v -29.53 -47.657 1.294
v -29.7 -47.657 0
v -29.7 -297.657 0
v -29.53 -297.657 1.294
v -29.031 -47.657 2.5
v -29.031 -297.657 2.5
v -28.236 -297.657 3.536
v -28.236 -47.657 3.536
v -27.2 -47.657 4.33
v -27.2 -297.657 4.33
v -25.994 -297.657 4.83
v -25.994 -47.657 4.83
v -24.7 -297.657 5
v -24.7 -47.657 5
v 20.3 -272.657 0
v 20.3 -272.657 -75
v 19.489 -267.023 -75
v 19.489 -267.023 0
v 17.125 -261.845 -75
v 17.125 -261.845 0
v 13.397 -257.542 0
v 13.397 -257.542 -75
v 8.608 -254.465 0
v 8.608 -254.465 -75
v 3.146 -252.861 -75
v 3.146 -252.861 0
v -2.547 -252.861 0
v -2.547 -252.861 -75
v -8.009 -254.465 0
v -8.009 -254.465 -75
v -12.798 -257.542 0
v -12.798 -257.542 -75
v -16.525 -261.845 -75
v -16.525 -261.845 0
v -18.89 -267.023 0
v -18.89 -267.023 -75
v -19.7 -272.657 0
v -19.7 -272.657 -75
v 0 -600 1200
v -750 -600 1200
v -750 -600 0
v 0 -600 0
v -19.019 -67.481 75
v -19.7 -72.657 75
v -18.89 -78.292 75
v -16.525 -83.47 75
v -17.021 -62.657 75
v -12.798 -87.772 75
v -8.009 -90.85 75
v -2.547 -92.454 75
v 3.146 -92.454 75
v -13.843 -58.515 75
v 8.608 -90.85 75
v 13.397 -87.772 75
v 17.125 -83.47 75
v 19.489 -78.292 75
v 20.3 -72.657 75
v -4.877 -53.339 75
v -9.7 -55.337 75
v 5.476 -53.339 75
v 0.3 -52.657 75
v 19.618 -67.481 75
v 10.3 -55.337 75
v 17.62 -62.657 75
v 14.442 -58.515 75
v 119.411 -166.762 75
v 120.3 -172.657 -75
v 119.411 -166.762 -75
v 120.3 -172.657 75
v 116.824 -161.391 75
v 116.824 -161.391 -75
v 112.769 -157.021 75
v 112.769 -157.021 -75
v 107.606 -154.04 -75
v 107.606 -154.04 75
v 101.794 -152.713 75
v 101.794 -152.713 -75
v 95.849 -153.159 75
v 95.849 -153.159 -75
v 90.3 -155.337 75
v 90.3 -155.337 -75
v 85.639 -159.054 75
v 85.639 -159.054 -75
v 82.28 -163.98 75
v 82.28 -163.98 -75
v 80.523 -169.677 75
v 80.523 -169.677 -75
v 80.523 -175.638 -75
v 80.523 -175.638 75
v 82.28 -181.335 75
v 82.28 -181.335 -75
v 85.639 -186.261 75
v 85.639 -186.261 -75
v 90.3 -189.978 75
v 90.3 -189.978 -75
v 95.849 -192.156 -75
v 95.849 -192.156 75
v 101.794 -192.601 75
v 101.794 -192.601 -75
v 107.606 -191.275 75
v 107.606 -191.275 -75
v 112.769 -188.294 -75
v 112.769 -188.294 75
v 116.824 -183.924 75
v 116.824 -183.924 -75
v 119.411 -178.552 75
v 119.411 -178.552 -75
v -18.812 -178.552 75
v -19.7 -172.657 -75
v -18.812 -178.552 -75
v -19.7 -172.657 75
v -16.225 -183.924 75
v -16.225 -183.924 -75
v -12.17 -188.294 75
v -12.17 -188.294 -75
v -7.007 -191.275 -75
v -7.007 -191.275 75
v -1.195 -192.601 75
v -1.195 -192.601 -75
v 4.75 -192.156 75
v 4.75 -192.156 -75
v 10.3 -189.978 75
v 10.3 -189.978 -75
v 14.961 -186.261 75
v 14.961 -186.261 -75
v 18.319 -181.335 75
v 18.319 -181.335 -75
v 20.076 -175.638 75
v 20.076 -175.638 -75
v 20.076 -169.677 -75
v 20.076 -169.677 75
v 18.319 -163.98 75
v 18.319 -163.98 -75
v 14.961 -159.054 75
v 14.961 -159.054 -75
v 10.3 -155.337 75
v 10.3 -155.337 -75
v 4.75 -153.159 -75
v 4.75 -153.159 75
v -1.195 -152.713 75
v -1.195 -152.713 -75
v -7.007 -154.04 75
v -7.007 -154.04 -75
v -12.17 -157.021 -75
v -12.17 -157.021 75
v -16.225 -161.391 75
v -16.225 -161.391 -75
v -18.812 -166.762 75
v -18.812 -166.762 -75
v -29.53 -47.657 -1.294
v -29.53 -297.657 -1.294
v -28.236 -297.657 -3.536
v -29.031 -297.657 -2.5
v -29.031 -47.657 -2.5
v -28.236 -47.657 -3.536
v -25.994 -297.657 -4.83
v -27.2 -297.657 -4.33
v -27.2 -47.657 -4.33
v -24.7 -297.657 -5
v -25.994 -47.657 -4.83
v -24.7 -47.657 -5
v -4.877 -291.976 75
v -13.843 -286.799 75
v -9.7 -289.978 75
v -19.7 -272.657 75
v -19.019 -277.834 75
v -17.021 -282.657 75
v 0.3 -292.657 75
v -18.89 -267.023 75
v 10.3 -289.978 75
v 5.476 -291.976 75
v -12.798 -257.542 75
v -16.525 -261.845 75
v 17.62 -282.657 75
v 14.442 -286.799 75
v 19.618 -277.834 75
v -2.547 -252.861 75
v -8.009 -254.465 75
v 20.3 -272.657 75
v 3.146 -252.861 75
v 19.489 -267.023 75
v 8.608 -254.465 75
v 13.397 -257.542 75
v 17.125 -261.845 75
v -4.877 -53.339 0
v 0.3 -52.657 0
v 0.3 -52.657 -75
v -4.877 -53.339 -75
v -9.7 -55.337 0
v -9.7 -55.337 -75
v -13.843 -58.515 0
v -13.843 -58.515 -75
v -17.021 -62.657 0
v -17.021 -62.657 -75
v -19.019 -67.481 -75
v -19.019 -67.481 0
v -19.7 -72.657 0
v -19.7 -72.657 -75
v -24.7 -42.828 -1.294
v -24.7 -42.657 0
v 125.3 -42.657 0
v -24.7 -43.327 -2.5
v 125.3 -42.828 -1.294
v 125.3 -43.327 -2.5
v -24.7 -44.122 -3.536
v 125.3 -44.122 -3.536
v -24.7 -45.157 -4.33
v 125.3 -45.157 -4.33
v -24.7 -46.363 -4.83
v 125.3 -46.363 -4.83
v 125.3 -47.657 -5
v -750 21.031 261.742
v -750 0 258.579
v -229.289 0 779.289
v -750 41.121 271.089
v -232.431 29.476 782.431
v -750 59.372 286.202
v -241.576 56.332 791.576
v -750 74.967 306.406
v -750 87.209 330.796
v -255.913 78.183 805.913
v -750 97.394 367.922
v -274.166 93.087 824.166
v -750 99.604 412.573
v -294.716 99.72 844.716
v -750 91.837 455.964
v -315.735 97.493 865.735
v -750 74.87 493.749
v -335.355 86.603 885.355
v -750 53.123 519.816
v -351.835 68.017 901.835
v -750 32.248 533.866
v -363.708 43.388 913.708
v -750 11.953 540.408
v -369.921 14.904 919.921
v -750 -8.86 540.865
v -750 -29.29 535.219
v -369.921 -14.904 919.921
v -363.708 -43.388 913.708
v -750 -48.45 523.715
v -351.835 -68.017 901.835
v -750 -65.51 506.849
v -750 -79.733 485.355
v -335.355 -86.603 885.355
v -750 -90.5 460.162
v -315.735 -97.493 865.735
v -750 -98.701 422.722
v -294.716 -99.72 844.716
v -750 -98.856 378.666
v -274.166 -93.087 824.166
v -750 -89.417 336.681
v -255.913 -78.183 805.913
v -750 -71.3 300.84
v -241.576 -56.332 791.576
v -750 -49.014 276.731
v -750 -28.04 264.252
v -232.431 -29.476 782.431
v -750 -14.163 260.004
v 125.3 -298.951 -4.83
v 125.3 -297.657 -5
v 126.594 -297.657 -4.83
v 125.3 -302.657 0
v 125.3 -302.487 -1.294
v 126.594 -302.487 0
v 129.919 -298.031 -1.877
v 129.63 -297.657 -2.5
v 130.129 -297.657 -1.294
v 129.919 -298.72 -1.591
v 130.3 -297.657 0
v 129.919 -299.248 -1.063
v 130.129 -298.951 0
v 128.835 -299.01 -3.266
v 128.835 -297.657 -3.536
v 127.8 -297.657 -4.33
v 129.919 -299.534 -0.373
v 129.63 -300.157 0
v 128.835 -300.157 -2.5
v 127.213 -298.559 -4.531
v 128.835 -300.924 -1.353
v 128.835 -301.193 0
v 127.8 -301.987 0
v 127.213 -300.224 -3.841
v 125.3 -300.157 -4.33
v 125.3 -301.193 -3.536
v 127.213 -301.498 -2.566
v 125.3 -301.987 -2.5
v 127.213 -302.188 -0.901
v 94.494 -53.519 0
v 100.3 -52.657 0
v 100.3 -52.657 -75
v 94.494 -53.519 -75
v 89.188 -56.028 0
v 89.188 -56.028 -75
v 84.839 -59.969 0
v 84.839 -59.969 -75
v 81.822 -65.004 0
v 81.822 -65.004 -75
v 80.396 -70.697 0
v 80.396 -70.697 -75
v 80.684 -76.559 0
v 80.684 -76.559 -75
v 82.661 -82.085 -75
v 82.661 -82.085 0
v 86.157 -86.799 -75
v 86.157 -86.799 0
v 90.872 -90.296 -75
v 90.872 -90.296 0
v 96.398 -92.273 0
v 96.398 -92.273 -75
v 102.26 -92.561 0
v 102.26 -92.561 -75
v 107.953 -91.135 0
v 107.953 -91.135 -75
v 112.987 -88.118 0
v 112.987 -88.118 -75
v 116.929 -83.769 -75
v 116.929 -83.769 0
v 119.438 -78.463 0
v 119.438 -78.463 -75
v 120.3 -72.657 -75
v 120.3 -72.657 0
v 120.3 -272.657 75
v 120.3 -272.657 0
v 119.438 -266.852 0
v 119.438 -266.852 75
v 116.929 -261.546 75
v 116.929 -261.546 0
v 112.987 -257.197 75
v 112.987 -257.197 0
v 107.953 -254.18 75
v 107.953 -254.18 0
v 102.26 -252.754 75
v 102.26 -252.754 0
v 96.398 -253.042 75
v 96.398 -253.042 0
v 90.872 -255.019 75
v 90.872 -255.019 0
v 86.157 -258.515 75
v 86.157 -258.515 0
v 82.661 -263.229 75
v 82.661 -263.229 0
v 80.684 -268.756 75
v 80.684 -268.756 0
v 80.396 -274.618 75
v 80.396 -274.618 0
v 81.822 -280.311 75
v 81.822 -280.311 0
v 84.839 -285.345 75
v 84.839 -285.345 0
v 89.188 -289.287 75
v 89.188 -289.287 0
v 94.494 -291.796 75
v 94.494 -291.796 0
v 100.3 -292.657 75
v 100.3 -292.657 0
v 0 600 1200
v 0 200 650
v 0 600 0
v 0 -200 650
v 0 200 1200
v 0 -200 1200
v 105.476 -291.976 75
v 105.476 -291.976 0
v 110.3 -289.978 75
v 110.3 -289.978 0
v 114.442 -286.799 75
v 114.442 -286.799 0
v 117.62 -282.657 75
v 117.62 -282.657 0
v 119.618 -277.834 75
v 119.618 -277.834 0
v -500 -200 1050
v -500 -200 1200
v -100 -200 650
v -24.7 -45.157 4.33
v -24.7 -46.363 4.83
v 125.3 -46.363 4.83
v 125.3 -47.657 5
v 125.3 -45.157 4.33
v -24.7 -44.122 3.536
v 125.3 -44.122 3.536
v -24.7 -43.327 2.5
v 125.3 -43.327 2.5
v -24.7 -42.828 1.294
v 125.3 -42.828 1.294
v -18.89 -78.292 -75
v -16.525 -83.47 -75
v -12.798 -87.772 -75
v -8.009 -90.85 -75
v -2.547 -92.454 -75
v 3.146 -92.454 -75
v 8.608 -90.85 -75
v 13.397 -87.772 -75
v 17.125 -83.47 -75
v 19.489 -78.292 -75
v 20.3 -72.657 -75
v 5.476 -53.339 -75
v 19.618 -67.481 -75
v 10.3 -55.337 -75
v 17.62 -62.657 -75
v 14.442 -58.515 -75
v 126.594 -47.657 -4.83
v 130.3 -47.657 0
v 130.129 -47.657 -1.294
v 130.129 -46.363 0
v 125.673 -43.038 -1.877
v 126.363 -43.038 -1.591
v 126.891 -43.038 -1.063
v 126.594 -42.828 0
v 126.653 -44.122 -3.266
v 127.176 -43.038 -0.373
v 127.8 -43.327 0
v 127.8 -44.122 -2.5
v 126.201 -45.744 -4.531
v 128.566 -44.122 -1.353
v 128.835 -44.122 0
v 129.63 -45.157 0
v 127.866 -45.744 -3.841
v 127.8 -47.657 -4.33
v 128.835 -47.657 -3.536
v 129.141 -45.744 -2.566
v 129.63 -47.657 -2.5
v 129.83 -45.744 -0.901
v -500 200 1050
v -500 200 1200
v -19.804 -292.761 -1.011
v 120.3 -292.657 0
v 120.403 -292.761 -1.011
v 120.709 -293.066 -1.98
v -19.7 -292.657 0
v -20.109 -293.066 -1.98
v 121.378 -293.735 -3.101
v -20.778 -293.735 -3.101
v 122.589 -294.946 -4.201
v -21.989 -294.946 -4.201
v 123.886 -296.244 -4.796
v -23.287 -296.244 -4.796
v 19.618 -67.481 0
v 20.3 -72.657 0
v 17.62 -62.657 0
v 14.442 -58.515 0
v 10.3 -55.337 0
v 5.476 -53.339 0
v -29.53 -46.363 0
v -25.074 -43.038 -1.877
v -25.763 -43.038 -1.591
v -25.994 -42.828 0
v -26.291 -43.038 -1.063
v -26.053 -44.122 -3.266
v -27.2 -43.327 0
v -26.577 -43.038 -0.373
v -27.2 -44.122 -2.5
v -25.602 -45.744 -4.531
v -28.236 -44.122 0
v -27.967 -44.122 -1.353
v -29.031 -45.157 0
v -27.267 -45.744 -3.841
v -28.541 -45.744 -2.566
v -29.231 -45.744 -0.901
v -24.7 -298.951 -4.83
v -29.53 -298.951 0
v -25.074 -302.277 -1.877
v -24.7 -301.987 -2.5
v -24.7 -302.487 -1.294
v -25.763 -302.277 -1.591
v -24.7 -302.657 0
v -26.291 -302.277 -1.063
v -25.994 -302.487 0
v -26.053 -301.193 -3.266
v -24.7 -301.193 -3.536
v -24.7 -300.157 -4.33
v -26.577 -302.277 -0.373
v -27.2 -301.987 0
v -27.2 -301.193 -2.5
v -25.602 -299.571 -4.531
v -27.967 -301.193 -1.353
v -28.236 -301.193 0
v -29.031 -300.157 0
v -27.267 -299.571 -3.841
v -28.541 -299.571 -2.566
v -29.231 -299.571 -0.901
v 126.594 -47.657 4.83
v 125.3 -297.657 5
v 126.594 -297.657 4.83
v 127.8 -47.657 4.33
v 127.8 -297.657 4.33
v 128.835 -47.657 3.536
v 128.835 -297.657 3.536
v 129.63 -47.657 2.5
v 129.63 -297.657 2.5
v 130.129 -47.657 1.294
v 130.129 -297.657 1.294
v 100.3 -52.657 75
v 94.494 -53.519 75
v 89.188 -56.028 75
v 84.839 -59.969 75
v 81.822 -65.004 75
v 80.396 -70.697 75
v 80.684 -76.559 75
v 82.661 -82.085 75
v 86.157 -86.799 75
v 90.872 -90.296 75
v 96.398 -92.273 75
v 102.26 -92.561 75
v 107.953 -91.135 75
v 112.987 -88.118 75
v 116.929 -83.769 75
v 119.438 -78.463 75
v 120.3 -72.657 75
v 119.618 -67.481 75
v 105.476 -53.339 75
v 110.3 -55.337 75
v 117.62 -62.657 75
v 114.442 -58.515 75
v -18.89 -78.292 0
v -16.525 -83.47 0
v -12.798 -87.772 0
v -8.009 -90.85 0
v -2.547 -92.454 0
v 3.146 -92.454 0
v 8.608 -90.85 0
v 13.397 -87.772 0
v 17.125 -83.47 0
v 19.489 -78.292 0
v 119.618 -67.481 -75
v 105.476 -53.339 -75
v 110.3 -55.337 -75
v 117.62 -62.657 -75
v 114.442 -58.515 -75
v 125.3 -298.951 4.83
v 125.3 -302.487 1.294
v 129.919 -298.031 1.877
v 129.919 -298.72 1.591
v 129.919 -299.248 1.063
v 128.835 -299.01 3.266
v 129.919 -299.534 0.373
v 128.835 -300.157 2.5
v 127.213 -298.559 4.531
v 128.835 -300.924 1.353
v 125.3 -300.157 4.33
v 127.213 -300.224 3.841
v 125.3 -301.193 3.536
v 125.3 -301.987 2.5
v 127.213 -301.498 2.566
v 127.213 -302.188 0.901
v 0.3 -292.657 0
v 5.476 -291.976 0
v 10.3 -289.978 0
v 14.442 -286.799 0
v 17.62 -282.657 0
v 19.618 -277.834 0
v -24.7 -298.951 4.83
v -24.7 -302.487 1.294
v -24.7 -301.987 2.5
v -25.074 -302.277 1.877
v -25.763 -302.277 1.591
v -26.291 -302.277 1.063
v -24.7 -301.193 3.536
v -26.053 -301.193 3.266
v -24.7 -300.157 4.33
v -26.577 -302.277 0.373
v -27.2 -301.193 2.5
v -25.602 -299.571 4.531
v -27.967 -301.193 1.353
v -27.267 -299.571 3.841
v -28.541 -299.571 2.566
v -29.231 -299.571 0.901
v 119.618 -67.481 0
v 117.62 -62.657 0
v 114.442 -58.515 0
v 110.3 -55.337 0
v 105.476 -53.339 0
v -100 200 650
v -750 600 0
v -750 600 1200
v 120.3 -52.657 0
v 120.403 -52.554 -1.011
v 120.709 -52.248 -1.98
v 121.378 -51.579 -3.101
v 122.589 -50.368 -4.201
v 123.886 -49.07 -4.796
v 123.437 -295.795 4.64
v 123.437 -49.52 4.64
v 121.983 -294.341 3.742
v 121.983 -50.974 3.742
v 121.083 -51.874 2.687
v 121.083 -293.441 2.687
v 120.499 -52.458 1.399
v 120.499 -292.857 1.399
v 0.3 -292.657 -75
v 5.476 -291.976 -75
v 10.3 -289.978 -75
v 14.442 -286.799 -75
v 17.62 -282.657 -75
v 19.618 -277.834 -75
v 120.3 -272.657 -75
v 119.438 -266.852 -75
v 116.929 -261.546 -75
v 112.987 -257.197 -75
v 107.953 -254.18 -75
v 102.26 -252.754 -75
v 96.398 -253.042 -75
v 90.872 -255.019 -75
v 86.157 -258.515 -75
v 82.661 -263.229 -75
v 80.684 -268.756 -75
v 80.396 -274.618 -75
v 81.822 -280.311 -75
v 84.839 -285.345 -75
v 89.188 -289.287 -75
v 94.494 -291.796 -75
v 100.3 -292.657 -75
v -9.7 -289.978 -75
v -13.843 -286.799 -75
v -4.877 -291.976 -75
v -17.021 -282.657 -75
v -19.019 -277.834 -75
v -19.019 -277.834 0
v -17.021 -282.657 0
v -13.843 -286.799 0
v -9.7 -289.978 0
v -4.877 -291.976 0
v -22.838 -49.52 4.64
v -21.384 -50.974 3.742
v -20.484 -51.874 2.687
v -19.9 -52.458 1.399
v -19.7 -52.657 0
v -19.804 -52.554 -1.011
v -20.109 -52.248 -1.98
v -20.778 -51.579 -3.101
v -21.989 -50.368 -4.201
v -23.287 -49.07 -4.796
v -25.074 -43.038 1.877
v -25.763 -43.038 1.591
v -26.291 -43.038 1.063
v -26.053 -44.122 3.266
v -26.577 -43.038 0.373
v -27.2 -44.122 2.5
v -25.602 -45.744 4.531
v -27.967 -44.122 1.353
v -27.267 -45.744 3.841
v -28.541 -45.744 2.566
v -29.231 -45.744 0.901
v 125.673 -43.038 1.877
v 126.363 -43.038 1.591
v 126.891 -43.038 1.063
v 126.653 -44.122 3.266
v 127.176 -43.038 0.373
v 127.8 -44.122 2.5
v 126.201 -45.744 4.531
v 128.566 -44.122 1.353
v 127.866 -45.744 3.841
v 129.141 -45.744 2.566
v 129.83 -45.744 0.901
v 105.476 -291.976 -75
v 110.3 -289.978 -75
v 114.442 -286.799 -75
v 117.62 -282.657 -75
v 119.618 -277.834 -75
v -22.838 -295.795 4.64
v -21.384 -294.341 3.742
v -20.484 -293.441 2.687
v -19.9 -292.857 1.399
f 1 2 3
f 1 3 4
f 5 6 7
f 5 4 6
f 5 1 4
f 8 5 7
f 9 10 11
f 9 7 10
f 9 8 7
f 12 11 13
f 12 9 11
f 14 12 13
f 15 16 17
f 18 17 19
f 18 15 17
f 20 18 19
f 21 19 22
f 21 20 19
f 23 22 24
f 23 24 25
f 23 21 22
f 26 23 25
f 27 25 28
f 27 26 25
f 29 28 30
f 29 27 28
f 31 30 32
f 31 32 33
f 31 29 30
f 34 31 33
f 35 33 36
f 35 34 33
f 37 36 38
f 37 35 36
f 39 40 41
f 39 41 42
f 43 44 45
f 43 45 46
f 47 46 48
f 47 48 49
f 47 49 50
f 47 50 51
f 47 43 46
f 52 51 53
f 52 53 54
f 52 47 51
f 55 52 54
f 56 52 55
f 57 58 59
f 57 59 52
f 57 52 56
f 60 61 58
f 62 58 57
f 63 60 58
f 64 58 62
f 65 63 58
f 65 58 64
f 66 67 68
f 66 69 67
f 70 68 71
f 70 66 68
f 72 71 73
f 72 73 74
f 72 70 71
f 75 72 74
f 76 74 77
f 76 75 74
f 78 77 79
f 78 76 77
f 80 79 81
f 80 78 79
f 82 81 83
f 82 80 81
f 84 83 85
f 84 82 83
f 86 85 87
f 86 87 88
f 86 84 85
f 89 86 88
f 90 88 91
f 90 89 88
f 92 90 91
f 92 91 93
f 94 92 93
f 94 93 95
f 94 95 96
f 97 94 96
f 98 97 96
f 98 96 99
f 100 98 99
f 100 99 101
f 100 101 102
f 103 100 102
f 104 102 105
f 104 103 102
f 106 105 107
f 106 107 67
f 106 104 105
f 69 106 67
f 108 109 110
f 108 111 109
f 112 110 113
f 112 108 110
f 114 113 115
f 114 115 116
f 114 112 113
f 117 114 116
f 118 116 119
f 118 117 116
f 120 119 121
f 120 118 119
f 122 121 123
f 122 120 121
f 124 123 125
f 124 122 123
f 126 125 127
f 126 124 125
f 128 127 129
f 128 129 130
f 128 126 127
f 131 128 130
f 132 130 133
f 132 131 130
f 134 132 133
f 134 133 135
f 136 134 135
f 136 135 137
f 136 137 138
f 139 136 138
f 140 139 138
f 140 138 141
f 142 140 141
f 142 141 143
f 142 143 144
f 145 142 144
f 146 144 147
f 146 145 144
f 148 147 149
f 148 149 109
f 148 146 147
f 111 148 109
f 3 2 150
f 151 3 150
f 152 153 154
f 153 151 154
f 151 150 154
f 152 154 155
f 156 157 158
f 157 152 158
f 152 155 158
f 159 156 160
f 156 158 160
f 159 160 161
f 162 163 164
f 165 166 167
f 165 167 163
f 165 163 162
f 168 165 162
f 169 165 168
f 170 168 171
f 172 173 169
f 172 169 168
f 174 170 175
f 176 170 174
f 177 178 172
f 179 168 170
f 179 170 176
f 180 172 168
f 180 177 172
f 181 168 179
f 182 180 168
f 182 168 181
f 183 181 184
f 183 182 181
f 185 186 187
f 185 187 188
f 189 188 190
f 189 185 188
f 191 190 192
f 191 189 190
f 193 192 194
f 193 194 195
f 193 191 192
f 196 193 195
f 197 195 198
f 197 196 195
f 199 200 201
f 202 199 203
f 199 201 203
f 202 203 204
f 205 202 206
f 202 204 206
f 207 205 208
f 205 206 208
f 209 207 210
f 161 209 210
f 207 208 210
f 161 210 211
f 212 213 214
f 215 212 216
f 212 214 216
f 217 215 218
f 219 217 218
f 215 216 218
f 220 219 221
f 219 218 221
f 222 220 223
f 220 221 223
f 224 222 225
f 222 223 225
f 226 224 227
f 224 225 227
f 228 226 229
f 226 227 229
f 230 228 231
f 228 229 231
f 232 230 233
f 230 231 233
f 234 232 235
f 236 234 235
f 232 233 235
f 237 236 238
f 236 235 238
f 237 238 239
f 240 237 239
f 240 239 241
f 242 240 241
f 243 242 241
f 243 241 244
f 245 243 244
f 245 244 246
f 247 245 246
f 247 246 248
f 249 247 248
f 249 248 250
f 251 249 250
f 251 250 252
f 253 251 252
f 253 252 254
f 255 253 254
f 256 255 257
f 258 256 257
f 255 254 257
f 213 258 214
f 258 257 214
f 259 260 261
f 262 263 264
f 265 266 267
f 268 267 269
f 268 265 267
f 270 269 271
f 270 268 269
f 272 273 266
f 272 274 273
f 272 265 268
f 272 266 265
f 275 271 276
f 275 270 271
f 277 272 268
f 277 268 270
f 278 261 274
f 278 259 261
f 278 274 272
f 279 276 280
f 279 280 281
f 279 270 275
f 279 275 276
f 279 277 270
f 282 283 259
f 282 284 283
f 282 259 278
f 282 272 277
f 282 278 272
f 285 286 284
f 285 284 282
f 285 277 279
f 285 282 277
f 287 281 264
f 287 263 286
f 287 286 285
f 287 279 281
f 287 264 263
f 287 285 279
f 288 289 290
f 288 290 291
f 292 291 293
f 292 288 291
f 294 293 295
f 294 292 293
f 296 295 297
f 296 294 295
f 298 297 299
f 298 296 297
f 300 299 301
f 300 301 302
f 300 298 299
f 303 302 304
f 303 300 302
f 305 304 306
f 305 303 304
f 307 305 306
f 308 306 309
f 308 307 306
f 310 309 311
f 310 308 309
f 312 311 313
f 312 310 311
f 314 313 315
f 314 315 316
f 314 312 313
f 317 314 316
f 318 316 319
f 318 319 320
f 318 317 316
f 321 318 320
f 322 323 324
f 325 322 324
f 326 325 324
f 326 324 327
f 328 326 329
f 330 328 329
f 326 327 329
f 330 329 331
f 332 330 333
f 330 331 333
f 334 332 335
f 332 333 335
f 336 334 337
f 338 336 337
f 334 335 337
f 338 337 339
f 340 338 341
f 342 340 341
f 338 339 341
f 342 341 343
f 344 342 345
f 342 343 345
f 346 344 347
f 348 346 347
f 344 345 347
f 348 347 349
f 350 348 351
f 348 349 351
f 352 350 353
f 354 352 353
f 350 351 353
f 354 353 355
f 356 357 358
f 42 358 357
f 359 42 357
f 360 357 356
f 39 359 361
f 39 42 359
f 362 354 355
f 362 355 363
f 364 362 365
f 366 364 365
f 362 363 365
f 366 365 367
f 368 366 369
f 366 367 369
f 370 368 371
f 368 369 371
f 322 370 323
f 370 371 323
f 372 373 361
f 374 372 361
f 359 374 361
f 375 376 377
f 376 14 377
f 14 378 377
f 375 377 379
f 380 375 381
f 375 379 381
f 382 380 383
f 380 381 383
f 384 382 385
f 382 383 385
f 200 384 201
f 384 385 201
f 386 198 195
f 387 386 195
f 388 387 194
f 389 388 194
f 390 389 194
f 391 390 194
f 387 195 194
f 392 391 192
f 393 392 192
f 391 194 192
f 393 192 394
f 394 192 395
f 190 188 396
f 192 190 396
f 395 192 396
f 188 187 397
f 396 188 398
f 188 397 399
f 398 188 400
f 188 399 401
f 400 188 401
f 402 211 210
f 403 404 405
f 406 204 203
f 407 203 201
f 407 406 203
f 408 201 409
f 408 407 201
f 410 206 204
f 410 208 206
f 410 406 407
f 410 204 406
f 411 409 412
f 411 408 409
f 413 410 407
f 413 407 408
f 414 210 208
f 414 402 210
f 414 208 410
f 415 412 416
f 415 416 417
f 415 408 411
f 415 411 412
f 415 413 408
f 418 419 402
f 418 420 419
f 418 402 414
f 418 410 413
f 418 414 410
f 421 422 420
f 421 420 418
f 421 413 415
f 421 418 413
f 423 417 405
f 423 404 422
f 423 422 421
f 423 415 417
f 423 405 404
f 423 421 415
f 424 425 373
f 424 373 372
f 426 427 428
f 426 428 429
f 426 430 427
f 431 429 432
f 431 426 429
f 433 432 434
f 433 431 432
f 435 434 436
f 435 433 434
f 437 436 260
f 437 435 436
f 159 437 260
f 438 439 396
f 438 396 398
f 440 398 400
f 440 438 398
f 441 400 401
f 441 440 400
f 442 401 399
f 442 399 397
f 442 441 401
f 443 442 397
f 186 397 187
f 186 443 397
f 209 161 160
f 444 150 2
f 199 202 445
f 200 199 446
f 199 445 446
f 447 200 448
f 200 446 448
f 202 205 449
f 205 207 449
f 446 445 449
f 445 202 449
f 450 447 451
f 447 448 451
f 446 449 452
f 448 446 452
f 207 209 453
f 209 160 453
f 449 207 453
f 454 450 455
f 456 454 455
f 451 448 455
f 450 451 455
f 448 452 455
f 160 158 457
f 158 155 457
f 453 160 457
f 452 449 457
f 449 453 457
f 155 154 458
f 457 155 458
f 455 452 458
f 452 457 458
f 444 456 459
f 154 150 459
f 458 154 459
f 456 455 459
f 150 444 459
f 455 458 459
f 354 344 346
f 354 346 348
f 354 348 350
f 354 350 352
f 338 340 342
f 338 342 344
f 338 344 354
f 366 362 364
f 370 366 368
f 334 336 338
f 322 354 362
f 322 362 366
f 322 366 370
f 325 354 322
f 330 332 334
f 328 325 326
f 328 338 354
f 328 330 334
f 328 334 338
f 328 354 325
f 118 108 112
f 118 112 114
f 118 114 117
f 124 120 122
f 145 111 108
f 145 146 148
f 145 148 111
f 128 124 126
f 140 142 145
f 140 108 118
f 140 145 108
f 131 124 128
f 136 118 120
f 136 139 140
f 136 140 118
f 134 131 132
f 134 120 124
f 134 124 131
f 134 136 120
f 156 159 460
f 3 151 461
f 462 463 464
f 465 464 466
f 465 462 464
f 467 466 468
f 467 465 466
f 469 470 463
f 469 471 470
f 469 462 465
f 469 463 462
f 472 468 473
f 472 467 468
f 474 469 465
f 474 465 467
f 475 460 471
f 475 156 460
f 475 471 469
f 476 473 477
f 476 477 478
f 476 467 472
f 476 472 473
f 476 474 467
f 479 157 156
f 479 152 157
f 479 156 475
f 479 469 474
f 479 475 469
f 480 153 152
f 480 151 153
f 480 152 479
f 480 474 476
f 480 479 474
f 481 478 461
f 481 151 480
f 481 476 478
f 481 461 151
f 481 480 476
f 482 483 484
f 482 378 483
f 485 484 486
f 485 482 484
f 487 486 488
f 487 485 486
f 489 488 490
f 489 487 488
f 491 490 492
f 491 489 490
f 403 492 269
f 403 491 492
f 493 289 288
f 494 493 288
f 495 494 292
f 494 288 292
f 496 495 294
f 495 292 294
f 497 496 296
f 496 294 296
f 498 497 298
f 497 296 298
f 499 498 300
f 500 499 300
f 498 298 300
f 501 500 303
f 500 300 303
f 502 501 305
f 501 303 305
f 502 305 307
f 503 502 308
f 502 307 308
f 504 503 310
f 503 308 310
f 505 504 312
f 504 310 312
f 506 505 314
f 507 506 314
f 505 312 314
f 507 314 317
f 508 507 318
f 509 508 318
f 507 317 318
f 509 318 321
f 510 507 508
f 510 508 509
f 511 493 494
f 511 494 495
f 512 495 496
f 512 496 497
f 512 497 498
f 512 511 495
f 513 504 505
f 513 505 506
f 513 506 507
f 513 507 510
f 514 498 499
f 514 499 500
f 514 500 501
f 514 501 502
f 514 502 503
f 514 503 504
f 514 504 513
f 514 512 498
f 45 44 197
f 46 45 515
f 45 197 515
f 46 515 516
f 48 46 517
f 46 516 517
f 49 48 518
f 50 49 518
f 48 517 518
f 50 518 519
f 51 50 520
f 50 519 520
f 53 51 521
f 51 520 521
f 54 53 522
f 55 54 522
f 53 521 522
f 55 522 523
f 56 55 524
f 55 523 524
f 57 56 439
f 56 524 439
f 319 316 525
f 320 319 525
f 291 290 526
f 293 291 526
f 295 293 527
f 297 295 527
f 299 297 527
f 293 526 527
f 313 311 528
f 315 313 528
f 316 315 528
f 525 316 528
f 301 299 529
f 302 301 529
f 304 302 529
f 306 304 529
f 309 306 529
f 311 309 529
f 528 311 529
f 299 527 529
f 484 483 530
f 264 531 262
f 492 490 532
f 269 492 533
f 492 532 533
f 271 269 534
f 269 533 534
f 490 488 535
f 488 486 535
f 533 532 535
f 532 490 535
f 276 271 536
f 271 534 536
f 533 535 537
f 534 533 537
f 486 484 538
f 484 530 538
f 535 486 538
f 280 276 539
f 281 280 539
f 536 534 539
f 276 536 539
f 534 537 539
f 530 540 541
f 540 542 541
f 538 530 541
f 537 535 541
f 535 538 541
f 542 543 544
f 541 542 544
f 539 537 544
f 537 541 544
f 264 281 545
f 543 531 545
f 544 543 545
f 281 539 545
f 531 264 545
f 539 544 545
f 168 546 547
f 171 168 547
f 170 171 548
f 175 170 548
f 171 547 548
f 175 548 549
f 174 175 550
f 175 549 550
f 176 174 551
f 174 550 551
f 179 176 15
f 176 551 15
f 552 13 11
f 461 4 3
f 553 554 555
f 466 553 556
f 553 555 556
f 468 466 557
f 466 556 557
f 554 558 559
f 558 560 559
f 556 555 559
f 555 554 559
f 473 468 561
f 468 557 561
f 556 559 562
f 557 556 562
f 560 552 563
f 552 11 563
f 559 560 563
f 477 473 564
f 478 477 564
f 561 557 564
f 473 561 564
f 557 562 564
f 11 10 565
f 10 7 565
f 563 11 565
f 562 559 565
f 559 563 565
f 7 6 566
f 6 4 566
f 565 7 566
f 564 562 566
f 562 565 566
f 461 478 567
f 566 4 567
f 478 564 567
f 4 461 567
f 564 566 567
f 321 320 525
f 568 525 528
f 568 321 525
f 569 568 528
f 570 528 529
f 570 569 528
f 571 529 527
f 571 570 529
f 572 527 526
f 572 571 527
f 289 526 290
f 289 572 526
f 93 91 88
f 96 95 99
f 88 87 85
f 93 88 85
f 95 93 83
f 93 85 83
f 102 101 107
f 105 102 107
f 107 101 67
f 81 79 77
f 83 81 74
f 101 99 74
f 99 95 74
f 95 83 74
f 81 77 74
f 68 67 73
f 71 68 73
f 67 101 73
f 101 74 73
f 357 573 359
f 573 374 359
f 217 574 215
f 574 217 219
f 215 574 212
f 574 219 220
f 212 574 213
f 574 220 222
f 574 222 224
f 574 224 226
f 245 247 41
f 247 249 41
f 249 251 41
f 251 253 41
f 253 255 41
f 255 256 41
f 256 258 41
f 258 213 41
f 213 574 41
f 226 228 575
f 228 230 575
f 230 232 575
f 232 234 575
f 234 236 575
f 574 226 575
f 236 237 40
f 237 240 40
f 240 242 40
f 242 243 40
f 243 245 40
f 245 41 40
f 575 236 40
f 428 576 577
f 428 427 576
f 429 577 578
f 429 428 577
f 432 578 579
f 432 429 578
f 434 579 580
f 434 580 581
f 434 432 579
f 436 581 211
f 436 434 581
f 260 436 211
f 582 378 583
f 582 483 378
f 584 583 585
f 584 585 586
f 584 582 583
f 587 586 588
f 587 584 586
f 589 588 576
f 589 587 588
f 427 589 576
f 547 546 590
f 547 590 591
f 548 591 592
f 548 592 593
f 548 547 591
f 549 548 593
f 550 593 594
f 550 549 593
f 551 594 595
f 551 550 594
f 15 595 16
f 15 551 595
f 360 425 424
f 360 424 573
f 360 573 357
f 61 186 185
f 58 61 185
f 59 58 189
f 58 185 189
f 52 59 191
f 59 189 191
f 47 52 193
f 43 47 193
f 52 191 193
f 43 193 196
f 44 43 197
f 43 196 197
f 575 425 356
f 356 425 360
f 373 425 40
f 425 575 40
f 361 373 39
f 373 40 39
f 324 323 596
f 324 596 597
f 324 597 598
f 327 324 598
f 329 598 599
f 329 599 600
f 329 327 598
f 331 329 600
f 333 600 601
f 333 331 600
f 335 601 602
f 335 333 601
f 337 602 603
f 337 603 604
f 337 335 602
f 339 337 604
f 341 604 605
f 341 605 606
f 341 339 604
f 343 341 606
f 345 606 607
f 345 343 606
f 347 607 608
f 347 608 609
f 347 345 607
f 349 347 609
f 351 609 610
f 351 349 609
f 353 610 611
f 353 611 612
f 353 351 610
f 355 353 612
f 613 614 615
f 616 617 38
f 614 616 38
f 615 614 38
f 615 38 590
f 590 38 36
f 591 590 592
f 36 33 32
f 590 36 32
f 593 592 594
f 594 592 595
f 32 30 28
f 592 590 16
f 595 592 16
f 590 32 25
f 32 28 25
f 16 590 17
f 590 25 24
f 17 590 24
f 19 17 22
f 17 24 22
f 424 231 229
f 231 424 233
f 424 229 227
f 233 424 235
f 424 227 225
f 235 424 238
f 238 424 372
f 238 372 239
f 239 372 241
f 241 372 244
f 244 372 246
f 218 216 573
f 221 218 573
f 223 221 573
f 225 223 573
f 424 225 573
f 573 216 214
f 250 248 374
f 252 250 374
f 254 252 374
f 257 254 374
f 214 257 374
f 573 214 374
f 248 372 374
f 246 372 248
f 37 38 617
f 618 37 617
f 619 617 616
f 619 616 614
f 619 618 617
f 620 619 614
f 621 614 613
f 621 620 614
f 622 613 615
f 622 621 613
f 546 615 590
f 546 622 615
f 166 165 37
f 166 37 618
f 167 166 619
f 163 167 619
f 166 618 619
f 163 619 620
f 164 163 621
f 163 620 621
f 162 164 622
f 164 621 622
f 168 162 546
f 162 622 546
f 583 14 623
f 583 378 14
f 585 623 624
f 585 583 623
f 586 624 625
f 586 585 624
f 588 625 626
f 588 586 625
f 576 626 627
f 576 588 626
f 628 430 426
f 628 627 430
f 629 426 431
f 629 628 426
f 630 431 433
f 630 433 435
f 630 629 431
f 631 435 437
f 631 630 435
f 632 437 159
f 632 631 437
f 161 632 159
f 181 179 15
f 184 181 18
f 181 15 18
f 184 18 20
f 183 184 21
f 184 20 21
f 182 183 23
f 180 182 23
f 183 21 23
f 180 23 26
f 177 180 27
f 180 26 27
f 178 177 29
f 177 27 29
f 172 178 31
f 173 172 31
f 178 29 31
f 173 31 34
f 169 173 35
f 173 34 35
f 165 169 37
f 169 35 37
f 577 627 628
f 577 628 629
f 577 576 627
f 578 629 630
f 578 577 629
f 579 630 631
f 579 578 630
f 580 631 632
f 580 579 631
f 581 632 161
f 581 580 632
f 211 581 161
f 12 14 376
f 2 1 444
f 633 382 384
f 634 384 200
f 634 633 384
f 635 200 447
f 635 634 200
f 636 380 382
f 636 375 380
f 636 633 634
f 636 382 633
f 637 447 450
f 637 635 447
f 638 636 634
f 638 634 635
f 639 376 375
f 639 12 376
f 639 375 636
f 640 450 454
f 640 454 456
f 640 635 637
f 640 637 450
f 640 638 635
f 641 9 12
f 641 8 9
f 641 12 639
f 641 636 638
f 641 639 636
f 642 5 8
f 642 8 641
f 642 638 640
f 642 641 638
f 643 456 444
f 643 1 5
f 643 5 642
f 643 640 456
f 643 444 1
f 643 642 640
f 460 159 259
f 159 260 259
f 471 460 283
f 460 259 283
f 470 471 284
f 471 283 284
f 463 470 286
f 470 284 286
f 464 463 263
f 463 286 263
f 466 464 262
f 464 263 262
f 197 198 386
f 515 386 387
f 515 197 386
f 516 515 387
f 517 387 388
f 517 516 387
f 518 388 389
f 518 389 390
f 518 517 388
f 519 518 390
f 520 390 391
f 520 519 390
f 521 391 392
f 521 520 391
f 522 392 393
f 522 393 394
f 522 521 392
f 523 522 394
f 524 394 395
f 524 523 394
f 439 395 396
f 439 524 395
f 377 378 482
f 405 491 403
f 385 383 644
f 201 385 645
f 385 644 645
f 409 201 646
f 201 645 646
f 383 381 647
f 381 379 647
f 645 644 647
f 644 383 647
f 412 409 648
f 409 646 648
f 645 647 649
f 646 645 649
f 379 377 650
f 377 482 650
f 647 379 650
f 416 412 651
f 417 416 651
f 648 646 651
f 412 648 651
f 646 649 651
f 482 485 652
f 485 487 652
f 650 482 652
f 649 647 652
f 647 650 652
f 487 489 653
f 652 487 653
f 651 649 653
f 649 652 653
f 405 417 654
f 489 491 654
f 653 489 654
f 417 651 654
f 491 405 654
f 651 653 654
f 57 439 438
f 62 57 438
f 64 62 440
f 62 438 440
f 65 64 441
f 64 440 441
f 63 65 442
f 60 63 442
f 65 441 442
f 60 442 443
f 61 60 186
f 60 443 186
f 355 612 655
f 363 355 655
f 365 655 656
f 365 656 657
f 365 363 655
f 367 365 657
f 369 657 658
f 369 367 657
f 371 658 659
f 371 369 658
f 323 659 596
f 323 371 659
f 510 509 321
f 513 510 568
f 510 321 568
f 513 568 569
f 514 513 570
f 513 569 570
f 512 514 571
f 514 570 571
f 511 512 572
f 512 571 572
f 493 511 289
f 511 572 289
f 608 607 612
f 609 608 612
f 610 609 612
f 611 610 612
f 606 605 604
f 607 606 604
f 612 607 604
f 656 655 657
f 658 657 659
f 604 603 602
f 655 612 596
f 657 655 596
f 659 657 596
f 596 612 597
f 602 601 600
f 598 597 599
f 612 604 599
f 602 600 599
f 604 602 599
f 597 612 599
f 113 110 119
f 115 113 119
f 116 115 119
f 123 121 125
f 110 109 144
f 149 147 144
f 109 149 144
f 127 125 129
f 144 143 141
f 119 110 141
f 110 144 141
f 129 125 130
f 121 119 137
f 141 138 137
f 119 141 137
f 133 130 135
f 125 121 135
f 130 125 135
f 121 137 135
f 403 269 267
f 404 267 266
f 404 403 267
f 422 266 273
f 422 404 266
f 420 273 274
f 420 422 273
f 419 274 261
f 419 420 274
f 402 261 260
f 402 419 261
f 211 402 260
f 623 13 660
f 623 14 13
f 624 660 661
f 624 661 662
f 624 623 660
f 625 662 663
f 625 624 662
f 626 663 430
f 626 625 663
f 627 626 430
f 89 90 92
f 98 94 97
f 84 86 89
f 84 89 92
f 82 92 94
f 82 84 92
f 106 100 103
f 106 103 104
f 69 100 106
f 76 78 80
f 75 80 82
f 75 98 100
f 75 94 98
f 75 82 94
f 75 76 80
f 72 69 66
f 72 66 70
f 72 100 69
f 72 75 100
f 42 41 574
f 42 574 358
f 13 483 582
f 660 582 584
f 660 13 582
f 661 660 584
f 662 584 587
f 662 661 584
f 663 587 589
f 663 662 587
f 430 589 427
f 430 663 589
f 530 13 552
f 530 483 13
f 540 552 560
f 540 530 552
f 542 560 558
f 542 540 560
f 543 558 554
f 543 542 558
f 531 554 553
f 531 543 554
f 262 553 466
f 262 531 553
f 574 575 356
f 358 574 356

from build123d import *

# Parameters (mm, degrees)
F0_W     = 750
F0_H     = 1200
F1_DEPTH = 600
F3_DEPTH = 200
F4_R     = 100
F5_DEPTH = 919.2398155425
F7_DEPTH = 75
F6_R     = 20
F6_W     = 160
F6_H     = 260
F8_DEPTH = 5
F9_R     = 4.99999


# Not quite as in the source:
# - a fillet or chamfer is up to 0.001 mm smaller than in the source, because OpenCascade refuses the exact size


with BuildPart() as f1:
    # F0 (on Front) → F1 (new body, symmetric)
    with BuildSketch(Plane.XZ):
        with Locations((-375, 600)):
            Rectangle(F0_W, F0_H)
    extrude(amount=F1_DEPTH, both=True)

    # F2 (on Front) → F3 (cut, symmetric)
    with BuildSketch(Plane.XZ):
        Polygon((0, 650), (0, 1200), (-500, 1200), (-500, 1050), (-100, 650), align=None)
    extrude(amount=F3_DEPTH, both=True, mode=Mode.SUBTRACT)

    # F4 (on face) → F5 (cut, through all)
    with BuildSketch(Plane(origin=(275, 0, 275), x_dir=(0.7071067812, 0, -0.7071067812), z_dir=(0.7071067812, 0, 0.7071067812))):
        with Locations((-813.1728008391, 0)):
            Circle(F4_R)
    extrude(amount=-F5_DEPTH, mode=Mode.SUBTRACT)


with BuildPart() as f7:
    # F6 (on Top) → F7 (new body, symmetric)
    with BuildSketch(Plane.XY):
        with BuildLine():
            ThreePointArc((20.2996149659, -172.657354176), (0.2996149659, -152.657354176), (-19.7003850341, -172.657354176))
            ThreePointArc((-19.7003850341, -172.657354176), (0.2996149659, -192.657354176), (20.2996149659, -172.657354176))
        make_face()
    extrude(amount=F7_DEPTH, both=True)


with BuildPart() as f7b:
    # F6 (on Top) → F7, piece 2 (new body, symmetric)
    with BuildSketch(Plane.XY):
        with Locations((100.2996149659, -172.657354176)):
            Circle(F6_R)
    extrude(amount=F7_DEPTH, both=True)


with BuildPart() as f7c:
    # F6 (on Top) → F7, piece 3 (new body, symmetric)
    with BuildSketch(Plane.XY):
        with BuildLine():
            ThreePointArc((120.2996149659, -72.657354176), (114.4417505896, -58.5152185523), (100.2996149659, -52.657354176))
            ThreePointArc((100.2996149659, -52.657354176), (86.1574793422, -86.7994897998), (120.2996149659, -72.657354176))
        make_face()
    extrude(amount=F7_DEPTH, both=True)


with BuildPart() as f7d:
    # F6 (on Top) → F7, piece 4 (new body, symmetric)
    with BuildSketch(Plane.XY):
        with BuildLine():
            ThreePointArc((20.2996149659, -72.657354176), (14.4417505732, -58.5152185358), (0.2996149193, -52.657354176))
            ThreePointArc((0.2996149193, -52.657354176), (-13.8425206743, -58.5152185688), (-19.7003850341, -72.657354176))
            ThreePointArc((-19.7003850341, -72.657354176), (0.2996149659, -92.657354176), (20.2996149659, -72.657354176))
        make_face()
    extrude(amount=F7_DEPTH, both=True)


with BuildPart() as f7e:
    # F6 (on Top) → F7, piece 5 (new body, symmetric)
    with BuildSketch(Plane.XY):
        with BuildLine():
            ThreePointArc((20.2996149659, -272.657354176), (0.2996149659, -252.657354176), (-19.7003850341, -272.657354176))
            ThreePointArc((-19.7003850341, -272.657354176), (-13.8425206578, -286.7994897998), (0.2996149659, -292.657354176))
            ThreePointArc((0.2996149659, -292.657354176), (14.4417505896, -286.7994897998), (20.2996149659, -272.657354176))
        make_face()
    extrude(amount=F7_DEPTH, both=True)


with BuildPart() as f7f:
    # F6 (on Top) → F7, piece 6 (new body, symmetric)
    with BuildSketch(Plane.XY):
        with BuildLine():
            ThreePointArc((100.2996149659, -292.657354176), (114.4417505896, -286.7994897998), (120.2996149659, -272.657354176))
            ThreePointArc((120.2996149659, -272.657354176), (86.1574793422, -258.5152185523), (100.2996149659, -292.657354176))
        make_face()
    extrude(amount=F7_DEPTH, both=True)


with BuildPart() as f8:
    # F6 (on Top) → F8 (new body, symmetric)
    with BuildSketch(Plane.XY):
        with Locations((50.2996149659, -172.657354176)):
            Rectangle(F6_W, F6_H)
        Polygon((-19.7003850341, -72.657354176), (-19.7003850341, -52.657354176), (0.2996149193, -52.657354176), (100.2996149659, -52.657354176), (120.2996149659, -52.657354176), (120.2996149659, -72.657354176), (120.2996149659, -172.657354176), (120.2996149659, -272.657354176), (120.2996149659, -292.657354176), (100.2996149659, -292.657354176), (0.2996149659, -292.657354176), (-19.7003850341, -292.657354176), (-19.7003850341, -272.657354176), (-19.7003850341, -172.657354176), align=None, mode=Mode.SUBTRACT)
    extrude(amount=F8_DEPTH, both=True)

    # F9 (radius 5 in the source; OpenCascade refuses exactly that, so slightly less here)
    f9_edges = [f8.edges().sort_by_distance(p)[0] for p in [
        (-29.700385, -172.657354, 5),
        (-19.700385, -172.657354, 5),
        (-29.700385, -172.657354, -5),
        (50.299615, -302.657354, -5),
        (50.299615, -302.657354, 5),
        (50.299615, -292.657354, 5),
        (50.299615, -292.657354, -5),
        (-19.700385, -172.657354, -5),
        (120.299615, -172.657354, -5),
        (130.299615, -172.657354, -5),
        (130.299615, -172.657354, 5),
        (120.299615, -172.657354, 5),
        (130.299615, -302.657354, 0),
        (-29.700385, -302.657354, 0),
        (50.299615, -42.657354, 5),
        (50.299615, -42.657354, -5),
        (130.299615, -42.657354, 0),
        (50.299615, -52.657354, 5),
        (-29.700385, -42.657354, 0),
        (50.299615, -52.657354, -5),
    ]]
    fillet(f9_edges, radius=F9_R)


solid = Compound([f1.part, f7.part, f7b.part, f7c.part, f7d.part, f7e.part, f7f.part, f8.part])
